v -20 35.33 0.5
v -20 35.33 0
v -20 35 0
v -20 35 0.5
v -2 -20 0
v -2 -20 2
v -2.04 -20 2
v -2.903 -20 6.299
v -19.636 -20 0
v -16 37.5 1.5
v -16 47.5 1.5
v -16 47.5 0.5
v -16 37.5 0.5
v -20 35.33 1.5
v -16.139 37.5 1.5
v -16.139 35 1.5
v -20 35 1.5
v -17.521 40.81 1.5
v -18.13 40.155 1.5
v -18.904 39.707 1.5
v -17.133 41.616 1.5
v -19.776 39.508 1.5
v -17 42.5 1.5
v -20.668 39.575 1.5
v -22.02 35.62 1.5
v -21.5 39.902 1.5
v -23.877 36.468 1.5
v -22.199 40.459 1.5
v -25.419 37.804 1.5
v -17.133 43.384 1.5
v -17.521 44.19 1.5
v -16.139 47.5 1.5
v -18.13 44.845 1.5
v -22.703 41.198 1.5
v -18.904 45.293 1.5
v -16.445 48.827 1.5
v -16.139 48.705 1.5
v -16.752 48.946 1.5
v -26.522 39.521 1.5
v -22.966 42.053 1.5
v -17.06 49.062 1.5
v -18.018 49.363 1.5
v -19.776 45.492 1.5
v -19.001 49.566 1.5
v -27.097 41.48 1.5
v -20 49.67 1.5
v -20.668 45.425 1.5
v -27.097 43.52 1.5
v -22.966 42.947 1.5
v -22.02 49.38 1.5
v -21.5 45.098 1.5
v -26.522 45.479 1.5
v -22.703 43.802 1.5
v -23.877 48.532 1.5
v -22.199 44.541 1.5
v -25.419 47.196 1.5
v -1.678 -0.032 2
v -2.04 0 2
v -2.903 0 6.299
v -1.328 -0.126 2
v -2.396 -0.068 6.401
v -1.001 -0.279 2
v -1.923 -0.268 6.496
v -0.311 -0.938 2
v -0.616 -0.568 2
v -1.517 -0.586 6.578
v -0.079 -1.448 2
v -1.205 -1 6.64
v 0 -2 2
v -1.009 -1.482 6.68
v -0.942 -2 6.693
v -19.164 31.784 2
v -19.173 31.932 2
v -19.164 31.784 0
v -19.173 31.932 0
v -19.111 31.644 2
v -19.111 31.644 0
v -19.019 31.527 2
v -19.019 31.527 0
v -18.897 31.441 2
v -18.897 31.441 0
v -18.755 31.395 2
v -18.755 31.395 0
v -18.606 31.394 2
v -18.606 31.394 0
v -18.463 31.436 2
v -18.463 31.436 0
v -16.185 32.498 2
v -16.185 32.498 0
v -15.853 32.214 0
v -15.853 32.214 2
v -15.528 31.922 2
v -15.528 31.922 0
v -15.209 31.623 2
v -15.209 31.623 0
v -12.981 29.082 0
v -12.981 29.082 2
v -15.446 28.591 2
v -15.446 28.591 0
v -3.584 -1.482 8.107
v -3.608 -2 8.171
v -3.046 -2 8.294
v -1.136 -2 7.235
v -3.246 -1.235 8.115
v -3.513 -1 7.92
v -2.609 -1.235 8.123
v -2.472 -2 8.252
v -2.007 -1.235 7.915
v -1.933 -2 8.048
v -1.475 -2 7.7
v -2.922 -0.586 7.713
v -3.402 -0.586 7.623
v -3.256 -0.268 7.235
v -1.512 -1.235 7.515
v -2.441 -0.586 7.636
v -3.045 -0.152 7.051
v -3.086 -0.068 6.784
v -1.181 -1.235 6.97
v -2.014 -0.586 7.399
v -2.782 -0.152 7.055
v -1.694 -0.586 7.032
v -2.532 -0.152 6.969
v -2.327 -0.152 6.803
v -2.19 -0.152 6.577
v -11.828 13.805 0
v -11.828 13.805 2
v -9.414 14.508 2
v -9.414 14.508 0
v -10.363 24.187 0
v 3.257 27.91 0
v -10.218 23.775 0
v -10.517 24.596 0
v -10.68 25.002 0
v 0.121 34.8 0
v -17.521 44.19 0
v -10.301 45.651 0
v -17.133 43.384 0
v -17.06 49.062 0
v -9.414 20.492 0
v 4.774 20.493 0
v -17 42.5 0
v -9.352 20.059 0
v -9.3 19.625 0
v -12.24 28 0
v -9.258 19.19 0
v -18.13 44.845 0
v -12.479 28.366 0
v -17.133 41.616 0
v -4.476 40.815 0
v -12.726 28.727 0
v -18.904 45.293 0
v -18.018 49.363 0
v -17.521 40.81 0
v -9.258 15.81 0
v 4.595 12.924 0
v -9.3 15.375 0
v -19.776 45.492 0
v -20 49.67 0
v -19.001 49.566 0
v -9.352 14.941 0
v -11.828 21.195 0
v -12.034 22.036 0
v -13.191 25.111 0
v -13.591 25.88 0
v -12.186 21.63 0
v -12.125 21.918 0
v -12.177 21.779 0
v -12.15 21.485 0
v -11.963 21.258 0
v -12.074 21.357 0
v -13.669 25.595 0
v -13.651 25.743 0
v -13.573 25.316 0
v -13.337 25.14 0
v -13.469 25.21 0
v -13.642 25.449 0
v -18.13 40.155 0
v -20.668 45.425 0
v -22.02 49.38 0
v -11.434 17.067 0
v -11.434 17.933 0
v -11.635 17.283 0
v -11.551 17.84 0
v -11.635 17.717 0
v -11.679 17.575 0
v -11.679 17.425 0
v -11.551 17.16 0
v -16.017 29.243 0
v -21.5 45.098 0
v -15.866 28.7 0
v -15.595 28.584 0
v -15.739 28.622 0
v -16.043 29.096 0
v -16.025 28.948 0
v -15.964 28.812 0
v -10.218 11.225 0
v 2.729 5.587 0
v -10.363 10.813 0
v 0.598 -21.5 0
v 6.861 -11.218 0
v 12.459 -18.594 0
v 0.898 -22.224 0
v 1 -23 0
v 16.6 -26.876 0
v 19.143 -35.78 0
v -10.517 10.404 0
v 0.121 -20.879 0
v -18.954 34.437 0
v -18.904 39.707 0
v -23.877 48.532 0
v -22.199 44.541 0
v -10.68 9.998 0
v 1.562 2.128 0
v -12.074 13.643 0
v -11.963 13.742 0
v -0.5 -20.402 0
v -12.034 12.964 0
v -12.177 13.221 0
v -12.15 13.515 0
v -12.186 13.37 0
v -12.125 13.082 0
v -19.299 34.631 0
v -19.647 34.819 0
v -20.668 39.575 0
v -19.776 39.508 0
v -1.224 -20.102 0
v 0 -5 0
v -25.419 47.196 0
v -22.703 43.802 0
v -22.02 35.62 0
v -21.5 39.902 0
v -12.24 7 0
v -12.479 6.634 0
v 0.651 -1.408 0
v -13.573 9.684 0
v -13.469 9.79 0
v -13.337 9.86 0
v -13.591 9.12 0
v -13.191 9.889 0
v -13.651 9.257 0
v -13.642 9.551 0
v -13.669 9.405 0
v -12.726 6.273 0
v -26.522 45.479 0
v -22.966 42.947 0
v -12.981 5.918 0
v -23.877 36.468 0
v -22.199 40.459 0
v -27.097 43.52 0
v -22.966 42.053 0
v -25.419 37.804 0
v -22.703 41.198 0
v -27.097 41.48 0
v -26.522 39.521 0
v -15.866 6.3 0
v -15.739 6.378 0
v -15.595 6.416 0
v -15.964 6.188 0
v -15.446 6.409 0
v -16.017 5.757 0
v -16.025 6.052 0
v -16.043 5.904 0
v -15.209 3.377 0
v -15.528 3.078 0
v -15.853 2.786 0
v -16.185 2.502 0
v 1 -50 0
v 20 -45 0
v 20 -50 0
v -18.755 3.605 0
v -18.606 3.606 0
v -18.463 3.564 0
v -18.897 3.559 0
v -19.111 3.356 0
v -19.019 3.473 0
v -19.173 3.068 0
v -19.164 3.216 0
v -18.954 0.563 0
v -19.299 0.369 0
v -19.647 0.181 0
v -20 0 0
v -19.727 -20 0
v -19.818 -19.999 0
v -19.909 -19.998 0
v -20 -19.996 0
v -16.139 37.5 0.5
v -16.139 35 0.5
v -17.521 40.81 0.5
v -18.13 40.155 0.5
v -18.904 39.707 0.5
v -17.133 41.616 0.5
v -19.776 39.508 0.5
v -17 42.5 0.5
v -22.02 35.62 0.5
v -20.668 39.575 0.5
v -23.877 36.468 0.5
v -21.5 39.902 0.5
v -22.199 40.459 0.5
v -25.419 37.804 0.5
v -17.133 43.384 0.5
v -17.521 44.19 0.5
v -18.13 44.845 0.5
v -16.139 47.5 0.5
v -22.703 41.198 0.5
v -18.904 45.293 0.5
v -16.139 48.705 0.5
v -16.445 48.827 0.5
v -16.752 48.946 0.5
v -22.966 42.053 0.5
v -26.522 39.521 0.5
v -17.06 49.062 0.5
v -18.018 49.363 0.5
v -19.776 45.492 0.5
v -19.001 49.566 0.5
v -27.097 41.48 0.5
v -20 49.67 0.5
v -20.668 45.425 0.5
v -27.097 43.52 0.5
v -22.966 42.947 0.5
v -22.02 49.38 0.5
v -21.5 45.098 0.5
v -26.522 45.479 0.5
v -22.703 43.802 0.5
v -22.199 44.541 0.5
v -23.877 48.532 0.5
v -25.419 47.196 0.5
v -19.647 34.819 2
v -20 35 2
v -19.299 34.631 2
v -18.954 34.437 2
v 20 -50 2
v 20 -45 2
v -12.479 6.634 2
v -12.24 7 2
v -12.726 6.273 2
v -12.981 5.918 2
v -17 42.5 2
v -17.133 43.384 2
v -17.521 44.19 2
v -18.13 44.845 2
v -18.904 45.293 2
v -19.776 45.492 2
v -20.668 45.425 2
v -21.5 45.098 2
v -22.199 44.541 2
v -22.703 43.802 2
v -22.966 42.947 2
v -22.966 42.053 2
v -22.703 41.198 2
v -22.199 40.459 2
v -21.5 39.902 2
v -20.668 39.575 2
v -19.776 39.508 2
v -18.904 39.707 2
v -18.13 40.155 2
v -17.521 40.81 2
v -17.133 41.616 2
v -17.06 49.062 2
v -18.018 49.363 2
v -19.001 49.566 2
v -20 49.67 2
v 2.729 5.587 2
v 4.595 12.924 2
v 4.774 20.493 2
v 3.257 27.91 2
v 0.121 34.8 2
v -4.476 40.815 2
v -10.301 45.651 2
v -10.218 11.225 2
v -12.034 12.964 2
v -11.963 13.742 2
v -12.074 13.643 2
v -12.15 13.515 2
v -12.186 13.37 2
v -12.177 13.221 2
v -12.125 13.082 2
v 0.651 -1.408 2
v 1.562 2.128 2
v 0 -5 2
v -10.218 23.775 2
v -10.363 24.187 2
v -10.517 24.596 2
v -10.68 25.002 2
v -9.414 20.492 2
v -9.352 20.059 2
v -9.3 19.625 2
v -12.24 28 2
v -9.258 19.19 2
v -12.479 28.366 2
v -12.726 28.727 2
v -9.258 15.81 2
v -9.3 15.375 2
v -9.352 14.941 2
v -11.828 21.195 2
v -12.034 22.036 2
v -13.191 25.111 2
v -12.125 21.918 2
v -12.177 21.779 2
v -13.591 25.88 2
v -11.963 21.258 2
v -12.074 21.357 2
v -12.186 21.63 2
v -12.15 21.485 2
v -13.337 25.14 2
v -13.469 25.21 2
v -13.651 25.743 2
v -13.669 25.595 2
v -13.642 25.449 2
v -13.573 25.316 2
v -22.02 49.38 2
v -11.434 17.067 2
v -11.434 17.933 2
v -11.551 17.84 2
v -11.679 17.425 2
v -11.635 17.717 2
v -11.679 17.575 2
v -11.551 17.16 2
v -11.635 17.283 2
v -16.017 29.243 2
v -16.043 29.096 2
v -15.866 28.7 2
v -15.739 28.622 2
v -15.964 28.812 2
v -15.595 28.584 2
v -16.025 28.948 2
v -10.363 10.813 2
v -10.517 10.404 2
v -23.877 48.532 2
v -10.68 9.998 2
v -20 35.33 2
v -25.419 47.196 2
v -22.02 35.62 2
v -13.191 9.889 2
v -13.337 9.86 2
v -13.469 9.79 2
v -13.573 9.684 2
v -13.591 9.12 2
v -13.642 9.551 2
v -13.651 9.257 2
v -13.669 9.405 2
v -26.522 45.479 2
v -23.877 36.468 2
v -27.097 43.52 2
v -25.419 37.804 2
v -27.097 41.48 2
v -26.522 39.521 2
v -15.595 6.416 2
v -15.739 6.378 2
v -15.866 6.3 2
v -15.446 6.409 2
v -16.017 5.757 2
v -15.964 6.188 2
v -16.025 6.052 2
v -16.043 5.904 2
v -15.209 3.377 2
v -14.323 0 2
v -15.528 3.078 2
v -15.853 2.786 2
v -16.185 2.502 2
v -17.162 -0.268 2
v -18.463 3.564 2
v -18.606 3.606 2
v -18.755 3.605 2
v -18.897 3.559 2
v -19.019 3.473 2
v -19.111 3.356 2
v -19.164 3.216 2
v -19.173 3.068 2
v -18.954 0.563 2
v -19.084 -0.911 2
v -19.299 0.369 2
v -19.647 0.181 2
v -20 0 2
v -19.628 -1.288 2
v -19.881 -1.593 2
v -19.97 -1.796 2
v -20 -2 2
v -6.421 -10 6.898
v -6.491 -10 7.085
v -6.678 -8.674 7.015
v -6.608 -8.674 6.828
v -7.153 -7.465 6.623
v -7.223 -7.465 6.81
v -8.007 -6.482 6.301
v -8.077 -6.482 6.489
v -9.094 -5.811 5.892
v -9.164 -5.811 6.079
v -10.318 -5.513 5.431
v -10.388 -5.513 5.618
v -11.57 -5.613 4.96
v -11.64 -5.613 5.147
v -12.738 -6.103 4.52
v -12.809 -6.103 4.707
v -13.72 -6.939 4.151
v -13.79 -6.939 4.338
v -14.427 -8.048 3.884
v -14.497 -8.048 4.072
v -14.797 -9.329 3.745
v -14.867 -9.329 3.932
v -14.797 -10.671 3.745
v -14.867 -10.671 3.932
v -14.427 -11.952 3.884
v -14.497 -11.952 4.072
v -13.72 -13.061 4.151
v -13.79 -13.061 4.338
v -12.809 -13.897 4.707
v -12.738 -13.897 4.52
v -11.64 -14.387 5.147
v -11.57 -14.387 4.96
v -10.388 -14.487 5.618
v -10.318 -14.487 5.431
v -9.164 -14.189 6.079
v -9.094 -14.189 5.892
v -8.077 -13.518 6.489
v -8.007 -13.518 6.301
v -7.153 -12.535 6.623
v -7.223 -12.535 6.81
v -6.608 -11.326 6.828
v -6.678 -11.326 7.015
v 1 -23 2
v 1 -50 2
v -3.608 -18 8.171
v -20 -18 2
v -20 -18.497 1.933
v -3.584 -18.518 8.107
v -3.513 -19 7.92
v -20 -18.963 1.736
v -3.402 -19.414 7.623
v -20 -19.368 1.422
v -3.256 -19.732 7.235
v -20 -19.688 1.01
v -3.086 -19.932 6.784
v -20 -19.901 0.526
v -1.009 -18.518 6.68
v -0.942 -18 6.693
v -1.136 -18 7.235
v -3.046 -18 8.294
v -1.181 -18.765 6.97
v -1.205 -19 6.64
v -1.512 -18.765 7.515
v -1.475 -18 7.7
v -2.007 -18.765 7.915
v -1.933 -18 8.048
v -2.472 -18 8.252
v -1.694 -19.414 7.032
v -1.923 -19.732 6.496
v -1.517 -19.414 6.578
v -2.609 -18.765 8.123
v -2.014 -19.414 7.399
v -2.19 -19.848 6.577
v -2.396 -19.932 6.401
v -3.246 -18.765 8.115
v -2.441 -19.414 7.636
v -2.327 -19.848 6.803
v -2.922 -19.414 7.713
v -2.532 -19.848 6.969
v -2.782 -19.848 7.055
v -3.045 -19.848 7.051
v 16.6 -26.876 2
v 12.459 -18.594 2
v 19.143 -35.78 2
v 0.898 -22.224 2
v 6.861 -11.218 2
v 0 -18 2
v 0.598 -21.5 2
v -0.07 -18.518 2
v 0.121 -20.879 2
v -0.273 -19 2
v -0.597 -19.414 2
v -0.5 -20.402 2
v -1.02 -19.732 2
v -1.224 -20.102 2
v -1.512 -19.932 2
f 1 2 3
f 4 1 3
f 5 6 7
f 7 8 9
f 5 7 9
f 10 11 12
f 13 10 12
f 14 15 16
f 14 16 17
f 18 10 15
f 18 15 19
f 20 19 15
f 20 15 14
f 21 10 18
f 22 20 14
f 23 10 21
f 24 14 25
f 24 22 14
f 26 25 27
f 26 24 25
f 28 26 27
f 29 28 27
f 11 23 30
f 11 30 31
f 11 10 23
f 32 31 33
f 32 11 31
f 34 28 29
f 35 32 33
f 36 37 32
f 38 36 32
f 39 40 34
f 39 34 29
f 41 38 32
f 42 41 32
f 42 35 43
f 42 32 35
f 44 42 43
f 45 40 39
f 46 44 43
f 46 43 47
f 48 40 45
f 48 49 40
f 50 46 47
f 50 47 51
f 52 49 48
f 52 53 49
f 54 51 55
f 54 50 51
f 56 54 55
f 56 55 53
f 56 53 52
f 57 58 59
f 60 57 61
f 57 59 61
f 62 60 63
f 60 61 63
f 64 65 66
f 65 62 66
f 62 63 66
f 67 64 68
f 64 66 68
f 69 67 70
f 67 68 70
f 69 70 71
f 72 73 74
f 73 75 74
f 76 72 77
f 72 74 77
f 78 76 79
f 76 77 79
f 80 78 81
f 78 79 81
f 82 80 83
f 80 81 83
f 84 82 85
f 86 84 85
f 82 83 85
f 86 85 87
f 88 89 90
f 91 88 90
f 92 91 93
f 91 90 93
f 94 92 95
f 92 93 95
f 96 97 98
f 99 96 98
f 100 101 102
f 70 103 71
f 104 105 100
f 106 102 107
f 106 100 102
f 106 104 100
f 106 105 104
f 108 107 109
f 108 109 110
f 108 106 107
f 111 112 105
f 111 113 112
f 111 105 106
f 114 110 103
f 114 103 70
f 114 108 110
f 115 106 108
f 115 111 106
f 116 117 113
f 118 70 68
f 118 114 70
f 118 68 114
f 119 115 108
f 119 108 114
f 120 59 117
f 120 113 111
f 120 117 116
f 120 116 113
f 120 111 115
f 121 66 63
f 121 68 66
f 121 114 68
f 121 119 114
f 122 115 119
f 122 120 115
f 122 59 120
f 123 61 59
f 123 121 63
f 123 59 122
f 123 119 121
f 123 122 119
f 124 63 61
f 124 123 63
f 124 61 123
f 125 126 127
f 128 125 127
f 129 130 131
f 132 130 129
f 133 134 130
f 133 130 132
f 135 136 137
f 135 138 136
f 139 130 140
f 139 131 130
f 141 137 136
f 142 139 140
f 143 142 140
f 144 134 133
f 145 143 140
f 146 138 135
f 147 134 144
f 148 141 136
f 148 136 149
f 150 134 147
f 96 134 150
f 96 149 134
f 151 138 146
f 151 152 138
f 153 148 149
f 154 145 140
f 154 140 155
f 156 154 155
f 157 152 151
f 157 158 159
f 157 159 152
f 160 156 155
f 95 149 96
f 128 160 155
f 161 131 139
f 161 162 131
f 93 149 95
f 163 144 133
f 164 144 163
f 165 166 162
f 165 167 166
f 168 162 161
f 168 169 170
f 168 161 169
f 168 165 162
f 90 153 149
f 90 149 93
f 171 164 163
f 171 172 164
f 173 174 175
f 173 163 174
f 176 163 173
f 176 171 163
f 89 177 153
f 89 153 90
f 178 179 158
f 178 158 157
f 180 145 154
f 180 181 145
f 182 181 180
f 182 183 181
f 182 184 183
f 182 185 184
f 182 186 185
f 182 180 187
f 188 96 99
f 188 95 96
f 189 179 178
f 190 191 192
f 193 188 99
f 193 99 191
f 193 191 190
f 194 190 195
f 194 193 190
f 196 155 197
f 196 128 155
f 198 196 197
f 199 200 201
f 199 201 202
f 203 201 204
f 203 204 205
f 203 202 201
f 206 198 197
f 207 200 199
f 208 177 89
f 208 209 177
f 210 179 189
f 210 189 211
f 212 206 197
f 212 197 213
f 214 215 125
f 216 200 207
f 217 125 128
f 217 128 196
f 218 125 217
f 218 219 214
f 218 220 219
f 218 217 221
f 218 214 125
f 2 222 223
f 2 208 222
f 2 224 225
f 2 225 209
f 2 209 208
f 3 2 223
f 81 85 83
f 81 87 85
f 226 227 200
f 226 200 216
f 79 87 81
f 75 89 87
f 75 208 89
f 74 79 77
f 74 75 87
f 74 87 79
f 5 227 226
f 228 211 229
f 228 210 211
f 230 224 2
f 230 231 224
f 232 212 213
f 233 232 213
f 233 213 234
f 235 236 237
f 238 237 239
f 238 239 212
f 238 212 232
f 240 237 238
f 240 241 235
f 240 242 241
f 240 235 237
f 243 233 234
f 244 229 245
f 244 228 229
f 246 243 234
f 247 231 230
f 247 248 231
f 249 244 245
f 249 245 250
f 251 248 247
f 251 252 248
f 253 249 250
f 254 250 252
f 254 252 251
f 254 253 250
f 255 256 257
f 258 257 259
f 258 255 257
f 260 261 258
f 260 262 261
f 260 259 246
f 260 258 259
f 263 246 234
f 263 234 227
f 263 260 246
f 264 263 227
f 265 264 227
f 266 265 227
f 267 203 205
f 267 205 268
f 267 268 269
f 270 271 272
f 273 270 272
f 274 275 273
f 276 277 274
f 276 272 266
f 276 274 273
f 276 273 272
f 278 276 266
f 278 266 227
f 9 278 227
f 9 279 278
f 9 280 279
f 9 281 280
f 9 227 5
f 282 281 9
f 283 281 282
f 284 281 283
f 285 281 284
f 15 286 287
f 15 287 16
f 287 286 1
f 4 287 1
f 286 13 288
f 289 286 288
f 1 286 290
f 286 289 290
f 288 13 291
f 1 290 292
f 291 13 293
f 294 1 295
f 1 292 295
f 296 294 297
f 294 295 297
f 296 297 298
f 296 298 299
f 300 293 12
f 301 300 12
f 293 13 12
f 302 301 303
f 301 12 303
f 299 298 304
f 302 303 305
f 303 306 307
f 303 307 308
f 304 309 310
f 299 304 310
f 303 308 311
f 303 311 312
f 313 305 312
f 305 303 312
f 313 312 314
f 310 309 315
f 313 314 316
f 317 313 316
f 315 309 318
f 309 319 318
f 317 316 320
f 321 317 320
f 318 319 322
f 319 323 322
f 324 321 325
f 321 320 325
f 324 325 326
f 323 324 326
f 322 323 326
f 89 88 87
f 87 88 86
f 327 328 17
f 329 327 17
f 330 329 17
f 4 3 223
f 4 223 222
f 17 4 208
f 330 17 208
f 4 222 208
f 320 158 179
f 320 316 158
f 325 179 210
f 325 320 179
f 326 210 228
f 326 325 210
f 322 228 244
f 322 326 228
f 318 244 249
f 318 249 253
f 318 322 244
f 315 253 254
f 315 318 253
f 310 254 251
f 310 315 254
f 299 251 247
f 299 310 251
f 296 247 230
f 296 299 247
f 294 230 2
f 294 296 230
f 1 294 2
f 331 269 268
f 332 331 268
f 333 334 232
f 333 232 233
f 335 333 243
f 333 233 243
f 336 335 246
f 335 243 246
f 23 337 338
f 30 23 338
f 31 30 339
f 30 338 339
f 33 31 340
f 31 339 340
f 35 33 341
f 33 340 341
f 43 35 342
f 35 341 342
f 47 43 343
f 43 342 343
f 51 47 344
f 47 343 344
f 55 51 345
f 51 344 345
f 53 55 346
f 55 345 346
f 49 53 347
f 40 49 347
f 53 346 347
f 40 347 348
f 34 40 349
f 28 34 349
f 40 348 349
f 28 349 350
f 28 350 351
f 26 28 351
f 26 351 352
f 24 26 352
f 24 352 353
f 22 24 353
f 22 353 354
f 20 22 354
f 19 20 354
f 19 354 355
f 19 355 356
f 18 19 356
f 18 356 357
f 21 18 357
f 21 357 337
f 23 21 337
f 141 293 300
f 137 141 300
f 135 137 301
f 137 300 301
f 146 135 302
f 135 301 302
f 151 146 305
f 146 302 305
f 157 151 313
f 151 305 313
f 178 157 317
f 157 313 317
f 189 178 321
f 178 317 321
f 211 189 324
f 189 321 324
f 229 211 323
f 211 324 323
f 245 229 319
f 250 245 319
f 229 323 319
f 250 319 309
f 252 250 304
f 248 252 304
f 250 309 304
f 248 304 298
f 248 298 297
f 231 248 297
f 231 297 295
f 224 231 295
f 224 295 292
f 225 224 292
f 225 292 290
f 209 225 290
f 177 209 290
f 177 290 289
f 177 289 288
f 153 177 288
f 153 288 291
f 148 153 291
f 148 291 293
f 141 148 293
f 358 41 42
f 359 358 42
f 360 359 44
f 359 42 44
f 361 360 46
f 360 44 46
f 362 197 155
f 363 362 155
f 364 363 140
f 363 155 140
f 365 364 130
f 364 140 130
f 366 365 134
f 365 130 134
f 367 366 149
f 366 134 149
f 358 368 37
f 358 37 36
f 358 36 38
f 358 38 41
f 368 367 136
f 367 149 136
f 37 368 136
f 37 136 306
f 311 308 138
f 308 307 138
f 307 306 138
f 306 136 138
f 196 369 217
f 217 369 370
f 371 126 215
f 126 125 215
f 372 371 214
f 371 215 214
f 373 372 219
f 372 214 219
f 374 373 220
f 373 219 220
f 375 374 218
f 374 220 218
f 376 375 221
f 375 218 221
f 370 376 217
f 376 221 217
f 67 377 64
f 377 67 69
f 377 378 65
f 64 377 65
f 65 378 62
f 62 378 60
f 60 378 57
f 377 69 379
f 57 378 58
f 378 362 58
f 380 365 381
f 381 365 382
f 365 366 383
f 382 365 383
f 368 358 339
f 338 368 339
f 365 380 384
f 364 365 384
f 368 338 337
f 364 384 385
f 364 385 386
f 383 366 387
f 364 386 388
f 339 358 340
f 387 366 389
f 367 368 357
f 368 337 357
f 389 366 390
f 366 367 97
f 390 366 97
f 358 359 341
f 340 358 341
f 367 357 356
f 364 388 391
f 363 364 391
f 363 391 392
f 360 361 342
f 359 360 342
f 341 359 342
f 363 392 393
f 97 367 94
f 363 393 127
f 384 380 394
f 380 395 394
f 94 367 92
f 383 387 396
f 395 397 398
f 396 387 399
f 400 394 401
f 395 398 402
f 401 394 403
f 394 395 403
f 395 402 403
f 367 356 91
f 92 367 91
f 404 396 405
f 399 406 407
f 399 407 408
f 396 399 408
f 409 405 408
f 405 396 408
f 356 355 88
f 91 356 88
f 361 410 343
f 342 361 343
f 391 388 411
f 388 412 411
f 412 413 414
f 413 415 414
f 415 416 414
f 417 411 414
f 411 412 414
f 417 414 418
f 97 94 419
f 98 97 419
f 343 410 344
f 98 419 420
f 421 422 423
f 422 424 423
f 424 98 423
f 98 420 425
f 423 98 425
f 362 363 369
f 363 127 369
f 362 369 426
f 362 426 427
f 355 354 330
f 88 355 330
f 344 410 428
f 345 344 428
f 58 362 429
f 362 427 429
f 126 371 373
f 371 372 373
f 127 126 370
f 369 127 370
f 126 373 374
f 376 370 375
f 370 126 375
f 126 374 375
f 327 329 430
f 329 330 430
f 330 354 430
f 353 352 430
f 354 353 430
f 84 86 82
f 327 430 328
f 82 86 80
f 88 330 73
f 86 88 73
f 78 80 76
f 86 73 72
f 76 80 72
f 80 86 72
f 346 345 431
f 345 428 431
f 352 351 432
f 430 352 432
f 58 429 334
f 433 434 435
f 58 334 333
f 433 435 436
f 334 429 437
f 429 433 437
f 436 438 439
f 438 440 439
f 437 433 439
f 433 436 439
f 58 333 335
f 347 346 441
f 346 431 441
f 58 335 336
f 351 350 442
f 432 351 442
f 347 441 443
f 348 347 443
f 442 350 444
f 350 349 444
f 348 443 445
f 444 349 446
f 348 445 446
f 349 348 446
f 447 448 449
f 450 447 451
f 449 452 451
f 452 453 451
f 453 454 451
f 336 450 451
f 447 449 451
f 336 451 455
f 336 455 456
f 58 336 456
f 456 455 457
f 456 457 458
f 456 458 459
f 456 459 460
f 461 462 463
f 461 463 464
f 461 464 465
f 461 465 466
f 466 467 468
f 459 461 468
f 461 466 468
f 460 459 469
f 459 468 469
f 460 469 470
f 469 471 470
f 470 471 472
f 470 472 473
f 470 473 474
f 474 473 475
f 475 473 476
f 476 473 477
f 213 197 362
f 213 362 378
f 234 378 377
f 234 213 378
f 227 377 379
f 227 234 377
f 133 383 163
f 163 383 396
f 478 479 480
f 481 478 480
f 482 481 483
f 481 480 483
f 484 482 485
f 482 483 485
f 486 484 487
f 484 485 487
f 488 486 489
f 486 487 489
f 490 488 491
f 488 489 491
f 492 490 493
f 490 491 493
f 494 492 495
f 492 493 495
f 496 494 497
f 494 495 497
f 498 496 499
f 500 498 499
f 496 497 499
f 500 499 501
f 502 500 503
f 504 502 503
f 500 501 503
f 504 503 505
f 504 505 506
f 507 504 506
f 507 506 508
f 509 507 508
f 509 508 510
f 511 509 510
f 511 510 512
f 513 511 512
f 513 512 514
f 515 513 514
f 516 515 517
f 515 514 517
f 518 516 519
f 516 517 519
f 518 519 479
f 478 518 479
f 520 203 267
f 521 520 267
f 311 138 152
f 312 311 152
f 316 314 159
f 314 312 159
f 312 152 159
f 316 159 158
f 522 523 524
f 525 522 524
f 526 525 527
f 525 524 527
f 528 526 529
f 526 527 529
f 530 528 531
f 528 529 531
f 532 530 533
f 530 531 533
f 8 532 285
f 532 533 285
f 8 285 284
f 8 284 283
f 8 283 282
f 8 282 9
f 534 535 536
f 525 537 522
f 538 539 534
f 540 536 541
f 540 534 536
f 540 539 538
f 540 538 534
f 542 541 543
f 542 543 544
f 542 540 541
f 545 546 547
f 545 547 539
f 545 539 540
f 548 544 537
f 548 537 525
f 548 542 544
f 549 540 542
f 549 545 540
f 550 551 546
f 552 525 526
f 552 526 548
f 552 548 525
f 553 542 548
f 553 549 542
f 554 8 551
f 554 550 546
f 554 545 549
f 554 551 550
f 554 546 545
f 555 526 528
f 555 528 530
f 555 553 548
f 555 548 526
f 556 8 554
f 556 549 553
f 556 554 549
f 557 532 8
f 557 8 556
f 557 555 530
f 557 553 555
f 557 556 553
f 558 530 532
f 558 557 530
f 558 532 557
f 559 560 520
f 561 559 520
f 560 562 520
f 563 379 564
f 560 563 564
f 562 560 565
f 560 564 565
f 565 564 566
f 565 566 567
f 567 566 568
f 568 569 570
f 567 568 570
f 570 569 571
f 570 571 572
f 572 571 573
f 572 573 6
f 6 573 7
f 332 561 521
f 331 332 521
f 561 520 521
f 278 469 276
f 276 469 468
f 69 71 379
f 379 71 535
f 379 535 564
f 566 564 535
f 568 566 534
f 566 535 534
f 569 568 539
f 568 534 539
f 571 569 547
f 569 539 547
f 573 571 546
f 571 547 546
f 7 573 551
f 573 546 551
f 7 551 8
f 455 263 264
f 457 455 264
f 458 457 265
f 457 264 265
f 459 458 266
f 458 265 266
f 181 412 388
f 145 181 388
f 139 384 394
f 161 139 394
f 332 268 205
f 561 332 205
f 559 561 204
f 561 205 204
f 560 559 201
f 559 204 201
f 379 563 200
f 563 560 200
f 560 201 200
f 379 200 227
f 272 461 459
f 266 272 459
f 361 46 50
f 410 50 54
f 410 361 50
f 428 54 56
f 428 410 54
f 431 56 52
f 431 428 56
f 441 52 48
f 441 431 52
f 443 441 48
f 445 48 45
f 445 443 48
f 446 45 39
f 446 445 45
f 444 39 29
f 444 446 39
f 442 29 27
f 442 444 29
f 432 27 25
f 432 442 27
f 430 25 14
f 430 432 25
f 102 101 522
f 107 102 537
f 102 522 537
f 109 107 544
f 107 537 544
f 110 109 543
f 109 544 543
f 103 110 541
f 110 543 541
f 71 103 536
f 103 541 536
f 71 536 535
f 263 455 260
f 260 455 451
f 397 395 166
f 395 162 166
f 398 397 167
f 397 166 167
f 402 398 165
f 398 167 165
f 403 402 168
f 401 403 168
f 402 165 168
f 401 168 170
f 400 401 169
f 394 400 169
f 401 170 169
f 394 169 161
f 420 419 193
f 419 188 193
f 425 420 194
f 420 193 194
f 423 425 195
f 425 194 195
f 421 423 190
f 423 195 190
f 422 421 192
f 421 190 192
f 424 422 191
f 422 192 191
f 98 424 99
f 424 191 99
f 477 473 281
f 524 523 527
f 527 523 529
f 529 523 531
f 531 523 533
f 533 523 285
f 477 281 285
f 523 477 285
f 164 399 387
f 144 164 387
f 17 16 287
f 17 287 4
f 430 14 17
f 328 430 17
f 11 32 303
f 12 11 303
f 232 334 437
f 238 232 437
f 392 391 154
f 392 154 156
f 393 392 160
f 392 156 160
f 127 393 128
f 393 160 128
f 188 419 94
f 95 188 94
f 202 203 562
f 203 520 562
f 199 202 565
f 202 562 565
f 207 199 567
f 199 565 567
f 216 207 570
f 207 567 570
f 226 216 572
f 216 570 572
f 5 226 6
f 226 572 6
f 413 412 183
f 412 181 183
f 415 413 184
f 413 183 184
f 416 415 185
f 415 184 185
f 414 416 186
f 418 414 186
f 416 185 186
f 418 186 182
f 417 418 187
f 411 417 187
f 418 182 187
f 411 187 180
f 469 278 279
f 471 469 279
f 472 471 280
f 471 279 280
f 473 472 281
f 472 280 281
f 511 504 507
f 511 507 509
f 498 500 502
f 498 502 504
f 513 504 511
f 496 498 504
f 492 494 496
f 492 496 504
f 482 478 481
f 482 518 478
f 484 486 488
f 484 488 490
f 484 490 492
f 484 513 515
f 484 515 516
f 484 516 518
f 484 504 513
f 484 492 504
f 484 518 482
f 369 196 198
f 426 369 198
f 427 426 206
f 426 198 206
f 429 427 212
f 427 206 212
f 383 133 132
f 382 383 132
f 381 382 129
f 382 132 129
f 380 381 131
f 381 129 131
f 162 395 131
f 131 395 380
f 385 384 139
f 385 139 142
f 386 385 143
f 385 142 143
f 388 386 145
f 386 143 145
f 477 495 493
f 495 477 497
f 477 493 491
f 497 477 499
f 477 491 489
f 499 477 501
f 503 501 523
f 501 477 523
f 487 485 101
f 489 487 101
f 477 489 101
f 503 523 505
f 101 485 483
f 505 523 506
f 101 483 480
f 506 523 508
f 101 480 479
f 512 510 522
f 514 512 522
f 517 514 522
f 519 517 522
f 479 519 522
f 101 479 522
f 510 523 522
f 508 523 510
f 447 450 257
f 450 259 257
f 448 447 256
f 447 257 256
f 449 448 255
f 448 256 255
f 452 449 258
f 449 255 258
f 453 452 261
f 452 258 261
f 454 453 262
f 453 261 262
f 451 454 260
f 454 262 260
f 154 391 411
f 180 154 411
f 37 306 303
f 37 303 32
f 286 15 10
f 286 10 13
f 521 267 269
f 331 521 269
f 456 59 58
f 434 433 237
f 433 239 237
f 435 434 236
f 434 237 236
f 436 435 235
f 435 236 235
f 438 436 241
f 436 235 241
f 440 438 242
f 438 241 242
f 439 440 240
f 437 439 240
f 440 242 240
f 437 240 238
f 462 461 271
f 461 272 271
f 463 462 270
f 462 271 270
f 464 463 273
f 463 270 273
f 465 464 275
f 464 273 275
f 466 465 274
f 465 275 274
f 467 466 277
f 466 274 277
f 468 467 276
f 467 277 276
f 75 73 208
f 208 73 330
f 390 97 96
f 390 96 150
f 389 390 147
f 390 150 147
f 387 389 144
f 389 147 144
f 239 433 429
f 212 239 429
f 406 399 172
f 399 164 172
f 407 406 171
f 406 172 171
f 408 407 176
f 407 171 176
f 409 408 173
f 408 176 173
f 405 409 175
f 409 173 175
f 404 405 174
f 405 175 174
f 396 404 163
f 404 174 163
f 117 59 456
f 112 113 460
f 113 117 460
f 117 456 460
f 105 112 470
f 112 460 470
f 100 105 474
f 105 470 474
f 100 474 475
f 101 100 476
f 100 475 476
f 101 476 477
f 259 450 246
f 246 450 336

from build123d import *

# Parameters (mm, degrees)
BOSS_EXTRUDE1_DEPTH       = 2
BOSS_EXTRUDE2_DEPTH       = 2
CIRPATTERN1_COUNT         = 5
CIRPATTERN1_ANGLE         = 55
CIRPATTERN2_COPY_1_DEPTH  = 2
CIRPATTERN2_COPY_2_DEPTH  = 2
CIRPATTERN2_COPY_3_DEPTH  = 2
CIRPATTERN2_COPY_4_DEPTH  = 2
CIRPATTERN2_COPY_5_DEPTH  = 2
CIRPATTERN2_COPY_6_DEPTH  = 2
CIRPATTERN2_COPY_7_DEPTH  = 2
CIRPATTERN2_COPY_8_DEPTH  = 2
CIRPATTERN2_COPY_9_DEPTH  = 2
CIRPATTERN2_COPY_10_DEPTH = 2
CIRPATTERN2_COPY_11_DEPTH = 2
CIRPATTERN2_COPY_12_DEPTH = 2
CIRPATTERN2_COPY_13_DEPTH = 2
CIRPATTERN2_COPY_14_DEPTH = 2
CIRPATTERN2_COPY_15_DEPTH = 2
CIRPATTERN2_COPY_16_DEPTH = 2
CIRPATTERN2_COPY_17_DEPTH = 2
CIRPATTERN2_COPY_18_DEPTH = 2
CIRPATTERN2_COPY_19_DEPTH = 2
CIRPATTERN2_COPY_20_DEPTH = 2
BOSS_EXTRUDE3_START       = -20
BOSS_EXTRUDE3_DEPTH       = 20
SKETCH7_R                 = 4.5
CUT_EXTRUDE1_DEPTH        = 0.2
FILLET1_R                 = 2
SKETCH15_R                = 7.170254919
BOSS_EXTRUDE6_DEPTH       = 2
SKETCH16_R                = 3
CUT_EXTRUDE2_DEPTH        = 58.252970512
SKETCH17_W                = 1
SKETCH17_H                = 10
CUT_EXTRUDE3_DEPTH        = 14
SKETCH18_W                = 9
SKETCH18_H                = 1
CUT_EXTRUDE4_DEPTH        = 20
FILLET2_R                 = 10
FILLET3_R                 = 50
FILLET5_R                 = 0.5
FILLET6_R                 = 3


with BuildPart() as part:
    # Sketch1 → Boss-Extrude1 (new body)
    with BuildSketch(Plane.XY):
        with BuildLine():
            Line((-20, -5), (-20, -20))
            Line((-20, -20), (0, -20))
            Line((0, -20), (1, -20))
            Line((1, -20), (1, -50))
            Line((1, -50), (20, -50))
            Line((20, -50), (20, -5))
            Line((20, -5), (0, -5))
            Line((0, -5), (0, 0))
            ThreePointArc((0, 0), (2.5, 30), (-20, 50))
            Line((-20, 50), (-20, 35))
            ThreePointArc((-20, 35), (-9.184405197, 17.5), (-20, 0))
            Line((-20, 0), (-20, -5))
        make_face()
    extrude(amount=BOSS_EXTRUDE1_DEPTH)

    # Sketch2 → Boss-Extrude2 (add)
    with BuildSketch(Plane.XY.offset(2)):
        Polygon((-12.184405197, 17.5), (-8.511312338, 19.620661151), (-8.511312338, 15.379338849), align=None)
    boss_extrude2 = extrude(amount=-BOSS_EXTRUDE2_DEPTH)

    # CirPattern1: Boss-Extrude2 ×5 about axis
    cirpattern1_axis = Axis((-28.75, 17.5, 0), (0, 0, -1))
    for i in range(1, CIRPATTERN1_COUNT):
        add(boss_extrude2.rotate(cirpattern1_axis, i * CIRPATTERN1_ANGLE / (CIRPATTERN1_COUNT - 1)))

    # CirPattern2 copy 1 sketch → CirPattern2 copy 1 (add)
    with BuildSketch(Plane.XY.offset(2)):
        Polygon((-12.184405197, 17.5), (-8.511312338, 19.620661151), (-8.511312338, 15.379338849), align=None)
    extrude(amount=-CIRPATTERN2_COPY_1_DEPTH)

    # CirPattern2 copy 2 sketch → CirPattern2 copy 2 (add)
    with BuildSketch(Plane(origin=(3.335587623, 7.334983183, 2), x_dir=(0.9713420698132613, 0.23768589232617357, 0), z_dir=(0, 0, 1))):
        Polygon((-12.184405197, 17.5), (-8.511312338, 19.620661151), (-8.511312338, 15.379338849), align=None)
    extrude(amount=-CIRPATTERN2_COPY_2_DEPTH)

    # CirPattern2 copy 3 sketch → CirPattern2 copy 3 (add)
    with BuildSketch(Plane(origin=(4.832162185, 15.25258305, 2), x_dir=(0.8870108331782213, 0.46174861323503485, 0), z_dir=(0, 0, 1))):
        Polygon((-12.184405197, 17.5), (-8.511312338, 19.620661151), (-8.511312338, 15.379338849), align=None)
    extrude(amount=-CIRPATTERN2_COPY_3_DEPTH)

    # CirPattern2 copy 4 sketch → CirPattern2 copy 4 (add)
    with BuildSketch(Plane(origin=(4.403946229, 23.298995553, 2), x_dir=(0.7518398074789764, 0.6593458151000701, 0), z_dir=(0, 0, 1))):
        Polygon((-12.184405197, 17.5), (-8.511312338, 19.620661151), (-8.511312338, 15.379338849), align=None)
    extrude(amount=-CIRPATTERN2_COPY_4_DEPTH)

    # CirPattern2 copy 5 sketch → CirPattern2 copy 5 (add)
    with BuildSketch(Plane(origin=(-4.983418609, -6.331955626, 2), x_dir=(0.9713420698132613, -0.23768589232617357, 0), z_dir=(0, 0, 1))):
        Polygon((-12.184405197, 17.5), (-8.511312338, 19.620661151), (-8.511312338, 15.379338849), align=None)
    extrude(amount=-CIRPATTERN2_COPY_5_DEPTH)

    # CirPattern2 copy 6 sketch → CirPattern2 copy 6 (add)
    with BuildSketch(Plane.XY.offset(2)):
        Polygon((-12.184405197, 17.5), (-8.511312338, 19.620661151), (-8.511312338, 15.379338849), align=None)
    extrude(amount=-CIRPATTERN2_COPY_6_DEPTH)

    # CirPattern2 copy 7 sketch → CirPattern2 copy 7 (add)
    with BuildSketch(Plane(origin=(3.335587623, 7.334983183, 2), x_dir=(0.9713420698132613, 0.2376858923261736, 0), z_dir=(0, 0, 1))):
        Polygon((-12.184405197, 17.5), (-8.511312338, 19.620661151), (-8.511312338, 15.379338849), align=None)
    extrude(amount=-CIRPATTERN2_COPY_7_DEPTH)

    # CirPattern2 copy 8 sketch → CirPattern2 copy 8 (add)
    with BuildSketch(Plane(origin=(4.832162185, 15.25258305, 2), x_dir=(0.8870108331782214, 0.4617486132350349, 0), z_dir=(0, 0, 1))):
        Polygon((-12.184405197, 17.5), (-8.511312338, 19.620661151), (-8.511312338, 15.379338849), align=None)
    extrude(amount=-CIRPATTERN2_COPY_8_DEPTH)

    # CirPattern2 copy 9 sketch → CirPattern2 copy 9 (add)
    with BuildSketch(Plane(origin=(-11.329039278, -11.297962211, 2), x_dir=(0.8870108331782213, -0.46174861323503485, 0), z_dir=(0, 0, 1))):
        Polygon((-12.184405197, 17.5), (-8.511312338, 19.620661151), (-8.511312338, 15.379338849), align=None)
    extrude(amount=-CIRPATTERN2_COPY_9_DEPTH)

    # CirPattern2 copy 10 sketch → CirPattern2 copy 10 (add)
    with BuildSketch(Plane(origin=(-4.983418609, -6.331955626, 2), x_dir=(0.9713420698132613, -0.2376858923261736, 0), z_dir=(0, 0, 1))):
        Polygon((-12.184405197, 17.5), (-8.511312338, 19.620661151), (-8.511312338, 15.379338849), align=None)
    extrude(amount=-CIRPATTERN2_COPY_10_DEPTH)

    # CirPattern2 copy 11 sketch → CirPattern2 copy 11 (add)
    with BuildSketch(Plane.XY.offset(2)):
        Polygon((-12.184405197, 17.5), (-8.511312338, 19.620661151), (-8.511312338, 15.379338849), align=None)
    extrude(amount=-CIRPATTERN2_COPY_11_DEPTH)

    # CirPattern2 copy 12 sketch → CirPattern2 copy 12 (add)
    with BuildSketch(Plane(origin=(3.335587623, 7.334983183, 2), x_dir=(0.9713420698132613, 0.2376858923261736, 0), z_dir=(0, 0, 1))):
        Polygon((-12.184405197, 17.5), (-8.511312338, 19.620661151), (-8.511312338, 15.379338849), align=None)
    extrude(amount=-CIRPATTERN2_COPY_12_DEPTH)

    # CirPattern2 copy 13 sketch → CirPattern2 copy 13 (add)
    with BuildSketch(Plane(origin=(-18.673157299, -14.613388815, 2), x_dir=(0.7518398074789764, -0.6593458151000701, 0), z_dir=(0, 0, 1))):
        Polygon((-12.184405197, 17.5), (-8.511312338, 19.620661151), (-8.511312338, 15.379338849), align=None)
    extrude(amount=-CIRPATTERN2_COPY_13_DEPTH)

    # CirPattern2 copy 14 sketch → CirPattern2 copy 14 (add)
    with BuildSketch(Plane(origin=(-11.329039278, -11.297962211, 2), x_dir=(0.8870108331782214, -0.4617486132350349, 0), z_dir=(0, 0, 1))):
        Polygon((-12.184405197, 17.5), (-8.511312338, 19.620661151), (-8.511312338, 15.379338849), align=None)
    extrude(amount=-CIRPATTERN2_COPY_14_DEPTH)

    # CirPattern2 copy 15 sketch → CirPattern2 copy 15 (add)
    with BuildSketch(Plane(origin=(-4.983418609, -6.331955626, 2), x_dir=(0.9713420698132613, -0.2376858923261736, 0), z_dir=(0, 0, 1))):
        Polygon((-12.184405197, 17.5), (-8.511312338, 19.620661151), (-8.511312338, 15.379338849), align=None)
    extrude(amount=-CIRPATTERN2_COPY_15_DEPTH)

    # CirPattern2 copy 16 sketch → CirPattern2 copy 16 (add)
    with BuildSketch(Plane.XY.offset(2)):
        Polygon((-12.184405197, 17.5), (-8.511312338, 19.620661151), (-8.511312338, 15.379338849), align=None)
    extrude(amount=-CIRPATTERN2_COPY_16_DEPTH)

    # CirPattern2 copy 17 sketch → CirPattern2 copy 17 (add)
    with BuildSketch(Plane(origin=(3.335587623, 7.334983183, 2), x_dir=(0.9713420698132613, 0.2376858923261736, 0), z_dir=(0, 0, 1))):
        Polygon((-12.184405197, 17.5), (-8.511312338, 19.620661151), (-8.511312338, 15.379338849), align=None)
    extrude(amount=-CIRPATTERN2_COPY_17_DEPTH)

    # CirPattern2 copy 18 sketch → CirPattern2 copy 18 (add)
    with BuildSketch(Plane(origin=(4.832162185, 15.25258305, 2), x_dir=(0.8870108331782213, 0.46174861323503485, 0), z_dir=(0, 0, 1))):
        Polygon((-12.184405197, 17.5), (-8.511312338, 19.620661151), (-8.511312338, 15.379338849), align=None)
    extrude(amount=-CIRPATTERN2_COPY_18_DEPTH)

    # CirPattern2 copy 19 sketch → CirPattern2 copy 19 (add)
    with BuildSketch(Plane(origin=(4.403946229, 23.298995553, 2), x_dir=(0.7518398074789764, 0.6593458151000701, 0), z_dir=(0, 0, 1))):
        Polygon((-12.184405197, 17.5), (-8.511312338, 19.620661151), (-8.511312338, 15.379338849), align=None)
    extrude(amount=-CIRPATTERN2_COPY_19_DEPTH)

    # CirPattern2 copy 20 sketch → CirPattern2 copy 20 (add)
    with BuildSketch(Plane(origin=(2.07548332, 31.013033637, 2), x_dir=(0.5735764363510444, 0.819152044288993, 0), z_dir=(0, 0, 1))):
        Polygon((-12.184405197, 17.5), (-8.511312338, 19.620661151), (-8.511312338, 15.379338849), align=None)
    extrude(amount=-CIRPATTERN2_COPY_20_DEPTH)

    # Sketch6 → Boss-Extrude3 (add)
    with BuildSketch(Plane(origin=(0, 0, 0), x_dir=(-1, 0, 0), z_dir=(0, 1, 0)).offset(BOSS_EXTRUDE3_START)):
        Polygon((20, 2), (1.405674507, 9), (0, 2), align=None)
    extrude(amount=BOSS_EXTRUDE3_DEPTH)

    # Sketch7 → Cut-Extrude1 (cut)
    with BuildSketch(Plane(origin=(-3.142049109, 0, 8.346326264), x_dir=(0.9358795174345517, 0, 0.3523202078315561), z_dir=(-0.3523202078315561, 0, 0.9358795174345517))):
        with Locations((-8.078805021, -10)):
            Circle(SKETCH7_R)
    extrude(amount=-CUT_EXTRUDE1_DEPTH, mode=Mode.SUBTRACT)

    # Fillet1
    # the kernel refuses this fillet: 2 mm, written as the material it takes off along each edge
    with BuildSketch(Plane(origin=(-2.90325086, -2, 6.299196783), x_dir=(0.9804275360510699, 0, 0.19688028482513967), z_dir=(0, 1, 0))) as fillet1_piece_1_section:
        Polygon((0, 0), (FILLET1_R * 1.02, 0), (FILLET1_R * 1.02, -FILLET1_R * 1.20008027832), (-FILLET1_R * 0.164391571457, -FILLET1_R * 1.00666549123), align=None)
    fillet1_piece_1 = extrude(amount=FILLET1_R * 1.02, mode=Mode.PRIVATE)
    fillet1_piece_1 = fillet1_piece_1 - Plane(origin=(-2.90325086, -2, 6.299196783), x_dir=(-0.4849326452097124, 0, -0.8745515019768195), z_dir=(0, 1, 0)) * Sphere(FILLET1_R, mode=Mode.PRIVATE)
    add(fillet1_piece_1, mode=Mode.SUBTRACT)
    with BuildSketch(Plane(origin=(-2.90325086, -18, 6.299196783), x_dir=(0.9804275360510699, 0, 0.19688028482513967), z_dir=(0, -1, 0))) as fillet1_piece_2_section:
        Polygon((0, 0), (FILLET1_R * 1.02, 0), (FILLET1_R * 1.02, FILLET1_R * 1.20008027832), (-FILLET1_R * 0.164391571457, FILLET1_R * 1.00666549123), align=None)
    fillet1_piece_2 = extrude(amount=FILLET1_R * 1.02, mode=Mode.PRIVATE)
    fillet1_piece_2 = fillet1_piece_2 - Plane(origin=(-2.90325086, -18, 6.299196783), x_dir=(-0.4849326452097124, 0, -0.8745515019768195), z_dir=(0, -1, 0)) * Sphere(FILLET1_R, mode=Mode.PRIVATE)
    add(fillet1_piece_2, mode=Mode.SUBTRACT)
    with BuildSketch(Plane(origin=(-0.942395788, 0, 6.692957352), x_dir=(-0.9804275360510698, 0, -0.19688028482513964), z_dir=(0.19688028482513967, 0, -0.9804275360510699))) as fillet1_piece_3_section:
        with BuildLine():
            CenterArc((FILLET1_R, -FILLET1_R), FILLET1_R, 90, 90)
            Line((0, -FILLET1_R), (0, 0))
            Line((0, 0), (FILLET1_R, 0))
        make_face()
    fillet1_piece_3 = extrude(amount=9.786643765, mode=Mode.PRIVATE)
    fillet1_piece_3 = split(fillet1_piece_3, bisect_by=Plane(origin=(-1.008191374, -0.349909599, 2), z_dir=(0, 0, 1)), keep=Keep.TOP, mode=Mode.PRIVATE)
    add(fillet1_piece_3, mode=Mode.SUBTRACT)
    with BuildSketch(Plane(origin=(-0.942395788, -20, 6.692957352), x_dir=(-0.9804275360510698, -8.88178419700125e-15, -0.19688028482513964), z_dir=(0.19688028482513967, 0, -0.9804275360510699))) as fillet1_piece_4_section:
        with BuildLine():
            CenterArc((FILLET1_R, FILLET1_R), FILLET1_R, 180, 90)
            Line((0, FILLET1_R), (0, 0))
            Line((0, 0), (FILLET1_R, 0))
        make_face()
    fillet1_piece_4 = extrude(amount=9.786643765, mode=Mode.PRIVATE)
    fillet1_piece_4 = split(fillet1_piece_4, bisect_by=Plane(origin=(-0.912007241, -19.549726982, 2), z_dir=(0, 0, 1)), keep=Keep.TOP, mode=Mode.PRIVATE)
    add(fillet1_piece_4, mode=Mode.SUBTRACT)
    with BuildSketch(Plane(origin=(-24.679397587, 0, 0.238398961), x_dir=(0, -1, 0), z_dir=(0.9358795174345516, 0, 0.35232020783155604))) as fillet1_piece_5_section:
        with BuildLine():
            CenterArc((FILLET1_R, FILLET1_R), FILLET1_R, 180, 90)
            Line((0, FILLET1_R), (0, 0))
            Line((0, 0), (FILLET1_R, 0))
        make_face()
    fillet1_piece_5 = extrude(amount=22.515191239, mode=Mode.PRIVATE)
    fillet1_piece_5 = split(fillet1_piece_5, bisect_by=Plane(origin=(-11.12775599, -0.460194973, 2), z_dir=(0, 0, 1)), keep=Keep.TOP, mode=Mode.PRIVATE)
    add(fillet1_piece_5, mode=Mode.SUBTRACT)
    with BuildSketch(Plane(origin=(-24.679397587, -20, 0.238398961), x_dir=(0, 1, 0), z_dir=(0.9358795174345516, 0, 0.35232020783155604))) as fillet1_piece_6:
        with BuildLine():
            CenterArc((FILLET1_R, -FILLET1_R), FILLET1_R, 90, 90)
            Line((0, -FILLET1_R), (0, 0))
            Line((0, 0), (FILLET1_R, 0))
        make_face()
    extrude(amount=22.515191239, mode=Mode.SUBTRACT)
    with BuildSketch(Plane(origin=(-1.405674507, -18, 9), x_dir=(-0.9358795174345511, 0, -0.3523202078315571), z_dir=(0, 1, 0))) as fillet1_piece_7:
        with BuildLine():
            CenterArc((FILLET1_R * 1.17654929247, -FILLET1_R), FILLET1_R, 90, 99.274709646)
            Line((FILLET1_R * 0.18962234028, -FILLET1_R * 1.16116820731), (0, 0))
            Line((0, 0), (FILLET1_R * 1.17654929247, 0))
        make_face()
    extrude(amount=16, mode=Mode.SUBTRACT)

    # Sketch15 → Boss-Extrude6 (add)
    with BuildSketch(Plane.XY.offset(2)):
        with Locations((-20, 42.5)):
            Circle(SKETCH15_R)
    extrude(amount=-BOSS_EXTRUDE6_DEPTH)

    # Sketch16 → Cut-Extrude2 (cut, through all)
    with BuildSketch(Plane.XY.offset(2)):
        with Locations((-20, 42.5)):
            Circle(SKETCH16_R)
    extrude(amount=-CUT_EXTRUDE2_DEPTH, mode=Mode.SUBTRACT)

    # Sketch17 → Cut-Extrude3 (cut)
    with BuildSketch(Plane(origin=(-30, 0, 0), x_dir=(0, 0, -1), z_dir=(1, 0, 0))):
        with Locations((-1, 42.5)):
            Rectangle(SKETCH17_W, SKETCH17_H)
    extrude(amount=CUT_EXTRUDE3_DEPTH, mode=Mode.SUBTRACT)

    # Sketch18 → Cut-Extrude4 (cut)
    with BuildSketch(Plane(origin=(0, 55, 0), x_dir=(-1, 0, 0), z_dir=(0, 1, 0))):
        with Locations((20.639314702, 1)):
            Rectangle(SKETCH18_W, SKETCH18_H)
    extrude(amount=-CUT_EXTRUDE4_DEPTH, mode=Mode.SUBTRACT)

    # Fillet2
    # the kernel refuses this fillet: 10 mm, written as the material it takes off along each edge
    with BuildSketch(Plane(origin=(-20, 50, -7.715216829), x_dir=(0.9526817633527526, -0.30396950138967865, 0), z_dir=(0, 0, 1))) as fillet2_piece_1:
        with BuildLine():
            CenterArc((2.627629196, -9.989485306), FILLET2_R, 87.372310771, 17.26738068)
            Line((0.100232448, -0.314142125), (0, 0))
            ThreePointArc((0, 0), (1.543043366, 0.035389598), (3.086086732, 0))
        make_face()
    extrude(amount=15.930433658, mode=Mode.SUBTRACT)
    with BuildSketch(Plane(origin=(-20, 50, -6.215216829), x_dir=(0, -1, 0), z_dir=(0, 0, 1))) as fillet2_piece_2:
        with BuildLine():
            CenterArc((10.315519613, -0.533204452), FILLET2_R, 159.676133382, 17.26738068)
            ThreePointArc((0.938076245, 2.940058549), (0.435323097, 1.480786633), (0, 0))
            Line((0, 0), (0.329745081, 0))
        make_face()
    extrude(amount=15.930433658, mode=Mode.SUBTRACT)

    # Fillet3
    # the kernel refuses this fillet: 50 mm, written as the material it adds along each edge
    with BuildSketch(Plane(origin=(0, 0, 0), x_dir=(0.43882064391112274, 0.8985746727331166, 0), z_dir=(0, 0, 1))) as fillet3_piece_1:
        with BuildLine():
            CenterArc((10.836486393, -49.78623208), FILLET3_R, 95.3000351, 12.553643777)
            Line((-4.492873364, -2.19410322), (-4.799460559, -1.242260642))
            ThreePointArc((-4.799460559, -1.242260642), (-2.685257326, -0.198476937), (-0.438820644, 0.898574673))
            Line((-0.438820644, 0.898574673), (0.092371197, 0.995724642))
            ThreePointArc((0.092371197, 0.995724642), (3.10896326, 0.856103065), (6.125555323, 0.995724642))
            Line((6.125555323, 0.995724642), (6.217926521, 0))
        make_face()
    extrude(amount=2)
    # the kernel refuses this fillet: 50 mm, written as the material it takes off along each edge
    with BuildSketch(Plane(origin=(20, -5, -100), x_dir=(-1, 0, 0), z_dir=(0, 0, 1))) as fillet3_2_piece_1:
        with BuildLine():
            CenterArc((50, 40), FILLET3_R, 180, 53.130102354)
            Line((0, 40), (-1, 40))
            Line((-1, 40), (-1, 0))
            Line((-1, 0), (0, -1))
            ThreePointArc((0, -1), (10, -1), (19.4, -0.8))
            Line((19.4, -0.8), (20, 0))
        make_face()
    extrude(amount=202, mode=Mode.SUBTRACT)

    # Fillet5
    fillet5_edges = [part.edges().sort_by_distance(p)[0] for p in [
        (-19.248365167, 3.930259152, 1),
        (-12.659140856, 21.437408183, 1),
        (-14.056137952, 25.149140428, 1),
        (-16.295326392, 28.422455608, 1),
        (-19.248365167, 31.069740848, 1),
        (-12.184405197, 17.5, 1),
        (-12.659140856, 13.562591817, 1),
        (-14.056137952, 9.850859572, 1),
        (-16.295326392, 6.577544392, 1),
    ]]
    fillet(fillet5_edges, radius=FILLET5_R)

    # Fillet6
    fillet6_edges = [part.edges().sort_by_distance(p)[0] for p in [
        (1, -20, 1),
    ]]
    fillet(fillet6_edges, radius=FILLET6_R)


solid = part.part
